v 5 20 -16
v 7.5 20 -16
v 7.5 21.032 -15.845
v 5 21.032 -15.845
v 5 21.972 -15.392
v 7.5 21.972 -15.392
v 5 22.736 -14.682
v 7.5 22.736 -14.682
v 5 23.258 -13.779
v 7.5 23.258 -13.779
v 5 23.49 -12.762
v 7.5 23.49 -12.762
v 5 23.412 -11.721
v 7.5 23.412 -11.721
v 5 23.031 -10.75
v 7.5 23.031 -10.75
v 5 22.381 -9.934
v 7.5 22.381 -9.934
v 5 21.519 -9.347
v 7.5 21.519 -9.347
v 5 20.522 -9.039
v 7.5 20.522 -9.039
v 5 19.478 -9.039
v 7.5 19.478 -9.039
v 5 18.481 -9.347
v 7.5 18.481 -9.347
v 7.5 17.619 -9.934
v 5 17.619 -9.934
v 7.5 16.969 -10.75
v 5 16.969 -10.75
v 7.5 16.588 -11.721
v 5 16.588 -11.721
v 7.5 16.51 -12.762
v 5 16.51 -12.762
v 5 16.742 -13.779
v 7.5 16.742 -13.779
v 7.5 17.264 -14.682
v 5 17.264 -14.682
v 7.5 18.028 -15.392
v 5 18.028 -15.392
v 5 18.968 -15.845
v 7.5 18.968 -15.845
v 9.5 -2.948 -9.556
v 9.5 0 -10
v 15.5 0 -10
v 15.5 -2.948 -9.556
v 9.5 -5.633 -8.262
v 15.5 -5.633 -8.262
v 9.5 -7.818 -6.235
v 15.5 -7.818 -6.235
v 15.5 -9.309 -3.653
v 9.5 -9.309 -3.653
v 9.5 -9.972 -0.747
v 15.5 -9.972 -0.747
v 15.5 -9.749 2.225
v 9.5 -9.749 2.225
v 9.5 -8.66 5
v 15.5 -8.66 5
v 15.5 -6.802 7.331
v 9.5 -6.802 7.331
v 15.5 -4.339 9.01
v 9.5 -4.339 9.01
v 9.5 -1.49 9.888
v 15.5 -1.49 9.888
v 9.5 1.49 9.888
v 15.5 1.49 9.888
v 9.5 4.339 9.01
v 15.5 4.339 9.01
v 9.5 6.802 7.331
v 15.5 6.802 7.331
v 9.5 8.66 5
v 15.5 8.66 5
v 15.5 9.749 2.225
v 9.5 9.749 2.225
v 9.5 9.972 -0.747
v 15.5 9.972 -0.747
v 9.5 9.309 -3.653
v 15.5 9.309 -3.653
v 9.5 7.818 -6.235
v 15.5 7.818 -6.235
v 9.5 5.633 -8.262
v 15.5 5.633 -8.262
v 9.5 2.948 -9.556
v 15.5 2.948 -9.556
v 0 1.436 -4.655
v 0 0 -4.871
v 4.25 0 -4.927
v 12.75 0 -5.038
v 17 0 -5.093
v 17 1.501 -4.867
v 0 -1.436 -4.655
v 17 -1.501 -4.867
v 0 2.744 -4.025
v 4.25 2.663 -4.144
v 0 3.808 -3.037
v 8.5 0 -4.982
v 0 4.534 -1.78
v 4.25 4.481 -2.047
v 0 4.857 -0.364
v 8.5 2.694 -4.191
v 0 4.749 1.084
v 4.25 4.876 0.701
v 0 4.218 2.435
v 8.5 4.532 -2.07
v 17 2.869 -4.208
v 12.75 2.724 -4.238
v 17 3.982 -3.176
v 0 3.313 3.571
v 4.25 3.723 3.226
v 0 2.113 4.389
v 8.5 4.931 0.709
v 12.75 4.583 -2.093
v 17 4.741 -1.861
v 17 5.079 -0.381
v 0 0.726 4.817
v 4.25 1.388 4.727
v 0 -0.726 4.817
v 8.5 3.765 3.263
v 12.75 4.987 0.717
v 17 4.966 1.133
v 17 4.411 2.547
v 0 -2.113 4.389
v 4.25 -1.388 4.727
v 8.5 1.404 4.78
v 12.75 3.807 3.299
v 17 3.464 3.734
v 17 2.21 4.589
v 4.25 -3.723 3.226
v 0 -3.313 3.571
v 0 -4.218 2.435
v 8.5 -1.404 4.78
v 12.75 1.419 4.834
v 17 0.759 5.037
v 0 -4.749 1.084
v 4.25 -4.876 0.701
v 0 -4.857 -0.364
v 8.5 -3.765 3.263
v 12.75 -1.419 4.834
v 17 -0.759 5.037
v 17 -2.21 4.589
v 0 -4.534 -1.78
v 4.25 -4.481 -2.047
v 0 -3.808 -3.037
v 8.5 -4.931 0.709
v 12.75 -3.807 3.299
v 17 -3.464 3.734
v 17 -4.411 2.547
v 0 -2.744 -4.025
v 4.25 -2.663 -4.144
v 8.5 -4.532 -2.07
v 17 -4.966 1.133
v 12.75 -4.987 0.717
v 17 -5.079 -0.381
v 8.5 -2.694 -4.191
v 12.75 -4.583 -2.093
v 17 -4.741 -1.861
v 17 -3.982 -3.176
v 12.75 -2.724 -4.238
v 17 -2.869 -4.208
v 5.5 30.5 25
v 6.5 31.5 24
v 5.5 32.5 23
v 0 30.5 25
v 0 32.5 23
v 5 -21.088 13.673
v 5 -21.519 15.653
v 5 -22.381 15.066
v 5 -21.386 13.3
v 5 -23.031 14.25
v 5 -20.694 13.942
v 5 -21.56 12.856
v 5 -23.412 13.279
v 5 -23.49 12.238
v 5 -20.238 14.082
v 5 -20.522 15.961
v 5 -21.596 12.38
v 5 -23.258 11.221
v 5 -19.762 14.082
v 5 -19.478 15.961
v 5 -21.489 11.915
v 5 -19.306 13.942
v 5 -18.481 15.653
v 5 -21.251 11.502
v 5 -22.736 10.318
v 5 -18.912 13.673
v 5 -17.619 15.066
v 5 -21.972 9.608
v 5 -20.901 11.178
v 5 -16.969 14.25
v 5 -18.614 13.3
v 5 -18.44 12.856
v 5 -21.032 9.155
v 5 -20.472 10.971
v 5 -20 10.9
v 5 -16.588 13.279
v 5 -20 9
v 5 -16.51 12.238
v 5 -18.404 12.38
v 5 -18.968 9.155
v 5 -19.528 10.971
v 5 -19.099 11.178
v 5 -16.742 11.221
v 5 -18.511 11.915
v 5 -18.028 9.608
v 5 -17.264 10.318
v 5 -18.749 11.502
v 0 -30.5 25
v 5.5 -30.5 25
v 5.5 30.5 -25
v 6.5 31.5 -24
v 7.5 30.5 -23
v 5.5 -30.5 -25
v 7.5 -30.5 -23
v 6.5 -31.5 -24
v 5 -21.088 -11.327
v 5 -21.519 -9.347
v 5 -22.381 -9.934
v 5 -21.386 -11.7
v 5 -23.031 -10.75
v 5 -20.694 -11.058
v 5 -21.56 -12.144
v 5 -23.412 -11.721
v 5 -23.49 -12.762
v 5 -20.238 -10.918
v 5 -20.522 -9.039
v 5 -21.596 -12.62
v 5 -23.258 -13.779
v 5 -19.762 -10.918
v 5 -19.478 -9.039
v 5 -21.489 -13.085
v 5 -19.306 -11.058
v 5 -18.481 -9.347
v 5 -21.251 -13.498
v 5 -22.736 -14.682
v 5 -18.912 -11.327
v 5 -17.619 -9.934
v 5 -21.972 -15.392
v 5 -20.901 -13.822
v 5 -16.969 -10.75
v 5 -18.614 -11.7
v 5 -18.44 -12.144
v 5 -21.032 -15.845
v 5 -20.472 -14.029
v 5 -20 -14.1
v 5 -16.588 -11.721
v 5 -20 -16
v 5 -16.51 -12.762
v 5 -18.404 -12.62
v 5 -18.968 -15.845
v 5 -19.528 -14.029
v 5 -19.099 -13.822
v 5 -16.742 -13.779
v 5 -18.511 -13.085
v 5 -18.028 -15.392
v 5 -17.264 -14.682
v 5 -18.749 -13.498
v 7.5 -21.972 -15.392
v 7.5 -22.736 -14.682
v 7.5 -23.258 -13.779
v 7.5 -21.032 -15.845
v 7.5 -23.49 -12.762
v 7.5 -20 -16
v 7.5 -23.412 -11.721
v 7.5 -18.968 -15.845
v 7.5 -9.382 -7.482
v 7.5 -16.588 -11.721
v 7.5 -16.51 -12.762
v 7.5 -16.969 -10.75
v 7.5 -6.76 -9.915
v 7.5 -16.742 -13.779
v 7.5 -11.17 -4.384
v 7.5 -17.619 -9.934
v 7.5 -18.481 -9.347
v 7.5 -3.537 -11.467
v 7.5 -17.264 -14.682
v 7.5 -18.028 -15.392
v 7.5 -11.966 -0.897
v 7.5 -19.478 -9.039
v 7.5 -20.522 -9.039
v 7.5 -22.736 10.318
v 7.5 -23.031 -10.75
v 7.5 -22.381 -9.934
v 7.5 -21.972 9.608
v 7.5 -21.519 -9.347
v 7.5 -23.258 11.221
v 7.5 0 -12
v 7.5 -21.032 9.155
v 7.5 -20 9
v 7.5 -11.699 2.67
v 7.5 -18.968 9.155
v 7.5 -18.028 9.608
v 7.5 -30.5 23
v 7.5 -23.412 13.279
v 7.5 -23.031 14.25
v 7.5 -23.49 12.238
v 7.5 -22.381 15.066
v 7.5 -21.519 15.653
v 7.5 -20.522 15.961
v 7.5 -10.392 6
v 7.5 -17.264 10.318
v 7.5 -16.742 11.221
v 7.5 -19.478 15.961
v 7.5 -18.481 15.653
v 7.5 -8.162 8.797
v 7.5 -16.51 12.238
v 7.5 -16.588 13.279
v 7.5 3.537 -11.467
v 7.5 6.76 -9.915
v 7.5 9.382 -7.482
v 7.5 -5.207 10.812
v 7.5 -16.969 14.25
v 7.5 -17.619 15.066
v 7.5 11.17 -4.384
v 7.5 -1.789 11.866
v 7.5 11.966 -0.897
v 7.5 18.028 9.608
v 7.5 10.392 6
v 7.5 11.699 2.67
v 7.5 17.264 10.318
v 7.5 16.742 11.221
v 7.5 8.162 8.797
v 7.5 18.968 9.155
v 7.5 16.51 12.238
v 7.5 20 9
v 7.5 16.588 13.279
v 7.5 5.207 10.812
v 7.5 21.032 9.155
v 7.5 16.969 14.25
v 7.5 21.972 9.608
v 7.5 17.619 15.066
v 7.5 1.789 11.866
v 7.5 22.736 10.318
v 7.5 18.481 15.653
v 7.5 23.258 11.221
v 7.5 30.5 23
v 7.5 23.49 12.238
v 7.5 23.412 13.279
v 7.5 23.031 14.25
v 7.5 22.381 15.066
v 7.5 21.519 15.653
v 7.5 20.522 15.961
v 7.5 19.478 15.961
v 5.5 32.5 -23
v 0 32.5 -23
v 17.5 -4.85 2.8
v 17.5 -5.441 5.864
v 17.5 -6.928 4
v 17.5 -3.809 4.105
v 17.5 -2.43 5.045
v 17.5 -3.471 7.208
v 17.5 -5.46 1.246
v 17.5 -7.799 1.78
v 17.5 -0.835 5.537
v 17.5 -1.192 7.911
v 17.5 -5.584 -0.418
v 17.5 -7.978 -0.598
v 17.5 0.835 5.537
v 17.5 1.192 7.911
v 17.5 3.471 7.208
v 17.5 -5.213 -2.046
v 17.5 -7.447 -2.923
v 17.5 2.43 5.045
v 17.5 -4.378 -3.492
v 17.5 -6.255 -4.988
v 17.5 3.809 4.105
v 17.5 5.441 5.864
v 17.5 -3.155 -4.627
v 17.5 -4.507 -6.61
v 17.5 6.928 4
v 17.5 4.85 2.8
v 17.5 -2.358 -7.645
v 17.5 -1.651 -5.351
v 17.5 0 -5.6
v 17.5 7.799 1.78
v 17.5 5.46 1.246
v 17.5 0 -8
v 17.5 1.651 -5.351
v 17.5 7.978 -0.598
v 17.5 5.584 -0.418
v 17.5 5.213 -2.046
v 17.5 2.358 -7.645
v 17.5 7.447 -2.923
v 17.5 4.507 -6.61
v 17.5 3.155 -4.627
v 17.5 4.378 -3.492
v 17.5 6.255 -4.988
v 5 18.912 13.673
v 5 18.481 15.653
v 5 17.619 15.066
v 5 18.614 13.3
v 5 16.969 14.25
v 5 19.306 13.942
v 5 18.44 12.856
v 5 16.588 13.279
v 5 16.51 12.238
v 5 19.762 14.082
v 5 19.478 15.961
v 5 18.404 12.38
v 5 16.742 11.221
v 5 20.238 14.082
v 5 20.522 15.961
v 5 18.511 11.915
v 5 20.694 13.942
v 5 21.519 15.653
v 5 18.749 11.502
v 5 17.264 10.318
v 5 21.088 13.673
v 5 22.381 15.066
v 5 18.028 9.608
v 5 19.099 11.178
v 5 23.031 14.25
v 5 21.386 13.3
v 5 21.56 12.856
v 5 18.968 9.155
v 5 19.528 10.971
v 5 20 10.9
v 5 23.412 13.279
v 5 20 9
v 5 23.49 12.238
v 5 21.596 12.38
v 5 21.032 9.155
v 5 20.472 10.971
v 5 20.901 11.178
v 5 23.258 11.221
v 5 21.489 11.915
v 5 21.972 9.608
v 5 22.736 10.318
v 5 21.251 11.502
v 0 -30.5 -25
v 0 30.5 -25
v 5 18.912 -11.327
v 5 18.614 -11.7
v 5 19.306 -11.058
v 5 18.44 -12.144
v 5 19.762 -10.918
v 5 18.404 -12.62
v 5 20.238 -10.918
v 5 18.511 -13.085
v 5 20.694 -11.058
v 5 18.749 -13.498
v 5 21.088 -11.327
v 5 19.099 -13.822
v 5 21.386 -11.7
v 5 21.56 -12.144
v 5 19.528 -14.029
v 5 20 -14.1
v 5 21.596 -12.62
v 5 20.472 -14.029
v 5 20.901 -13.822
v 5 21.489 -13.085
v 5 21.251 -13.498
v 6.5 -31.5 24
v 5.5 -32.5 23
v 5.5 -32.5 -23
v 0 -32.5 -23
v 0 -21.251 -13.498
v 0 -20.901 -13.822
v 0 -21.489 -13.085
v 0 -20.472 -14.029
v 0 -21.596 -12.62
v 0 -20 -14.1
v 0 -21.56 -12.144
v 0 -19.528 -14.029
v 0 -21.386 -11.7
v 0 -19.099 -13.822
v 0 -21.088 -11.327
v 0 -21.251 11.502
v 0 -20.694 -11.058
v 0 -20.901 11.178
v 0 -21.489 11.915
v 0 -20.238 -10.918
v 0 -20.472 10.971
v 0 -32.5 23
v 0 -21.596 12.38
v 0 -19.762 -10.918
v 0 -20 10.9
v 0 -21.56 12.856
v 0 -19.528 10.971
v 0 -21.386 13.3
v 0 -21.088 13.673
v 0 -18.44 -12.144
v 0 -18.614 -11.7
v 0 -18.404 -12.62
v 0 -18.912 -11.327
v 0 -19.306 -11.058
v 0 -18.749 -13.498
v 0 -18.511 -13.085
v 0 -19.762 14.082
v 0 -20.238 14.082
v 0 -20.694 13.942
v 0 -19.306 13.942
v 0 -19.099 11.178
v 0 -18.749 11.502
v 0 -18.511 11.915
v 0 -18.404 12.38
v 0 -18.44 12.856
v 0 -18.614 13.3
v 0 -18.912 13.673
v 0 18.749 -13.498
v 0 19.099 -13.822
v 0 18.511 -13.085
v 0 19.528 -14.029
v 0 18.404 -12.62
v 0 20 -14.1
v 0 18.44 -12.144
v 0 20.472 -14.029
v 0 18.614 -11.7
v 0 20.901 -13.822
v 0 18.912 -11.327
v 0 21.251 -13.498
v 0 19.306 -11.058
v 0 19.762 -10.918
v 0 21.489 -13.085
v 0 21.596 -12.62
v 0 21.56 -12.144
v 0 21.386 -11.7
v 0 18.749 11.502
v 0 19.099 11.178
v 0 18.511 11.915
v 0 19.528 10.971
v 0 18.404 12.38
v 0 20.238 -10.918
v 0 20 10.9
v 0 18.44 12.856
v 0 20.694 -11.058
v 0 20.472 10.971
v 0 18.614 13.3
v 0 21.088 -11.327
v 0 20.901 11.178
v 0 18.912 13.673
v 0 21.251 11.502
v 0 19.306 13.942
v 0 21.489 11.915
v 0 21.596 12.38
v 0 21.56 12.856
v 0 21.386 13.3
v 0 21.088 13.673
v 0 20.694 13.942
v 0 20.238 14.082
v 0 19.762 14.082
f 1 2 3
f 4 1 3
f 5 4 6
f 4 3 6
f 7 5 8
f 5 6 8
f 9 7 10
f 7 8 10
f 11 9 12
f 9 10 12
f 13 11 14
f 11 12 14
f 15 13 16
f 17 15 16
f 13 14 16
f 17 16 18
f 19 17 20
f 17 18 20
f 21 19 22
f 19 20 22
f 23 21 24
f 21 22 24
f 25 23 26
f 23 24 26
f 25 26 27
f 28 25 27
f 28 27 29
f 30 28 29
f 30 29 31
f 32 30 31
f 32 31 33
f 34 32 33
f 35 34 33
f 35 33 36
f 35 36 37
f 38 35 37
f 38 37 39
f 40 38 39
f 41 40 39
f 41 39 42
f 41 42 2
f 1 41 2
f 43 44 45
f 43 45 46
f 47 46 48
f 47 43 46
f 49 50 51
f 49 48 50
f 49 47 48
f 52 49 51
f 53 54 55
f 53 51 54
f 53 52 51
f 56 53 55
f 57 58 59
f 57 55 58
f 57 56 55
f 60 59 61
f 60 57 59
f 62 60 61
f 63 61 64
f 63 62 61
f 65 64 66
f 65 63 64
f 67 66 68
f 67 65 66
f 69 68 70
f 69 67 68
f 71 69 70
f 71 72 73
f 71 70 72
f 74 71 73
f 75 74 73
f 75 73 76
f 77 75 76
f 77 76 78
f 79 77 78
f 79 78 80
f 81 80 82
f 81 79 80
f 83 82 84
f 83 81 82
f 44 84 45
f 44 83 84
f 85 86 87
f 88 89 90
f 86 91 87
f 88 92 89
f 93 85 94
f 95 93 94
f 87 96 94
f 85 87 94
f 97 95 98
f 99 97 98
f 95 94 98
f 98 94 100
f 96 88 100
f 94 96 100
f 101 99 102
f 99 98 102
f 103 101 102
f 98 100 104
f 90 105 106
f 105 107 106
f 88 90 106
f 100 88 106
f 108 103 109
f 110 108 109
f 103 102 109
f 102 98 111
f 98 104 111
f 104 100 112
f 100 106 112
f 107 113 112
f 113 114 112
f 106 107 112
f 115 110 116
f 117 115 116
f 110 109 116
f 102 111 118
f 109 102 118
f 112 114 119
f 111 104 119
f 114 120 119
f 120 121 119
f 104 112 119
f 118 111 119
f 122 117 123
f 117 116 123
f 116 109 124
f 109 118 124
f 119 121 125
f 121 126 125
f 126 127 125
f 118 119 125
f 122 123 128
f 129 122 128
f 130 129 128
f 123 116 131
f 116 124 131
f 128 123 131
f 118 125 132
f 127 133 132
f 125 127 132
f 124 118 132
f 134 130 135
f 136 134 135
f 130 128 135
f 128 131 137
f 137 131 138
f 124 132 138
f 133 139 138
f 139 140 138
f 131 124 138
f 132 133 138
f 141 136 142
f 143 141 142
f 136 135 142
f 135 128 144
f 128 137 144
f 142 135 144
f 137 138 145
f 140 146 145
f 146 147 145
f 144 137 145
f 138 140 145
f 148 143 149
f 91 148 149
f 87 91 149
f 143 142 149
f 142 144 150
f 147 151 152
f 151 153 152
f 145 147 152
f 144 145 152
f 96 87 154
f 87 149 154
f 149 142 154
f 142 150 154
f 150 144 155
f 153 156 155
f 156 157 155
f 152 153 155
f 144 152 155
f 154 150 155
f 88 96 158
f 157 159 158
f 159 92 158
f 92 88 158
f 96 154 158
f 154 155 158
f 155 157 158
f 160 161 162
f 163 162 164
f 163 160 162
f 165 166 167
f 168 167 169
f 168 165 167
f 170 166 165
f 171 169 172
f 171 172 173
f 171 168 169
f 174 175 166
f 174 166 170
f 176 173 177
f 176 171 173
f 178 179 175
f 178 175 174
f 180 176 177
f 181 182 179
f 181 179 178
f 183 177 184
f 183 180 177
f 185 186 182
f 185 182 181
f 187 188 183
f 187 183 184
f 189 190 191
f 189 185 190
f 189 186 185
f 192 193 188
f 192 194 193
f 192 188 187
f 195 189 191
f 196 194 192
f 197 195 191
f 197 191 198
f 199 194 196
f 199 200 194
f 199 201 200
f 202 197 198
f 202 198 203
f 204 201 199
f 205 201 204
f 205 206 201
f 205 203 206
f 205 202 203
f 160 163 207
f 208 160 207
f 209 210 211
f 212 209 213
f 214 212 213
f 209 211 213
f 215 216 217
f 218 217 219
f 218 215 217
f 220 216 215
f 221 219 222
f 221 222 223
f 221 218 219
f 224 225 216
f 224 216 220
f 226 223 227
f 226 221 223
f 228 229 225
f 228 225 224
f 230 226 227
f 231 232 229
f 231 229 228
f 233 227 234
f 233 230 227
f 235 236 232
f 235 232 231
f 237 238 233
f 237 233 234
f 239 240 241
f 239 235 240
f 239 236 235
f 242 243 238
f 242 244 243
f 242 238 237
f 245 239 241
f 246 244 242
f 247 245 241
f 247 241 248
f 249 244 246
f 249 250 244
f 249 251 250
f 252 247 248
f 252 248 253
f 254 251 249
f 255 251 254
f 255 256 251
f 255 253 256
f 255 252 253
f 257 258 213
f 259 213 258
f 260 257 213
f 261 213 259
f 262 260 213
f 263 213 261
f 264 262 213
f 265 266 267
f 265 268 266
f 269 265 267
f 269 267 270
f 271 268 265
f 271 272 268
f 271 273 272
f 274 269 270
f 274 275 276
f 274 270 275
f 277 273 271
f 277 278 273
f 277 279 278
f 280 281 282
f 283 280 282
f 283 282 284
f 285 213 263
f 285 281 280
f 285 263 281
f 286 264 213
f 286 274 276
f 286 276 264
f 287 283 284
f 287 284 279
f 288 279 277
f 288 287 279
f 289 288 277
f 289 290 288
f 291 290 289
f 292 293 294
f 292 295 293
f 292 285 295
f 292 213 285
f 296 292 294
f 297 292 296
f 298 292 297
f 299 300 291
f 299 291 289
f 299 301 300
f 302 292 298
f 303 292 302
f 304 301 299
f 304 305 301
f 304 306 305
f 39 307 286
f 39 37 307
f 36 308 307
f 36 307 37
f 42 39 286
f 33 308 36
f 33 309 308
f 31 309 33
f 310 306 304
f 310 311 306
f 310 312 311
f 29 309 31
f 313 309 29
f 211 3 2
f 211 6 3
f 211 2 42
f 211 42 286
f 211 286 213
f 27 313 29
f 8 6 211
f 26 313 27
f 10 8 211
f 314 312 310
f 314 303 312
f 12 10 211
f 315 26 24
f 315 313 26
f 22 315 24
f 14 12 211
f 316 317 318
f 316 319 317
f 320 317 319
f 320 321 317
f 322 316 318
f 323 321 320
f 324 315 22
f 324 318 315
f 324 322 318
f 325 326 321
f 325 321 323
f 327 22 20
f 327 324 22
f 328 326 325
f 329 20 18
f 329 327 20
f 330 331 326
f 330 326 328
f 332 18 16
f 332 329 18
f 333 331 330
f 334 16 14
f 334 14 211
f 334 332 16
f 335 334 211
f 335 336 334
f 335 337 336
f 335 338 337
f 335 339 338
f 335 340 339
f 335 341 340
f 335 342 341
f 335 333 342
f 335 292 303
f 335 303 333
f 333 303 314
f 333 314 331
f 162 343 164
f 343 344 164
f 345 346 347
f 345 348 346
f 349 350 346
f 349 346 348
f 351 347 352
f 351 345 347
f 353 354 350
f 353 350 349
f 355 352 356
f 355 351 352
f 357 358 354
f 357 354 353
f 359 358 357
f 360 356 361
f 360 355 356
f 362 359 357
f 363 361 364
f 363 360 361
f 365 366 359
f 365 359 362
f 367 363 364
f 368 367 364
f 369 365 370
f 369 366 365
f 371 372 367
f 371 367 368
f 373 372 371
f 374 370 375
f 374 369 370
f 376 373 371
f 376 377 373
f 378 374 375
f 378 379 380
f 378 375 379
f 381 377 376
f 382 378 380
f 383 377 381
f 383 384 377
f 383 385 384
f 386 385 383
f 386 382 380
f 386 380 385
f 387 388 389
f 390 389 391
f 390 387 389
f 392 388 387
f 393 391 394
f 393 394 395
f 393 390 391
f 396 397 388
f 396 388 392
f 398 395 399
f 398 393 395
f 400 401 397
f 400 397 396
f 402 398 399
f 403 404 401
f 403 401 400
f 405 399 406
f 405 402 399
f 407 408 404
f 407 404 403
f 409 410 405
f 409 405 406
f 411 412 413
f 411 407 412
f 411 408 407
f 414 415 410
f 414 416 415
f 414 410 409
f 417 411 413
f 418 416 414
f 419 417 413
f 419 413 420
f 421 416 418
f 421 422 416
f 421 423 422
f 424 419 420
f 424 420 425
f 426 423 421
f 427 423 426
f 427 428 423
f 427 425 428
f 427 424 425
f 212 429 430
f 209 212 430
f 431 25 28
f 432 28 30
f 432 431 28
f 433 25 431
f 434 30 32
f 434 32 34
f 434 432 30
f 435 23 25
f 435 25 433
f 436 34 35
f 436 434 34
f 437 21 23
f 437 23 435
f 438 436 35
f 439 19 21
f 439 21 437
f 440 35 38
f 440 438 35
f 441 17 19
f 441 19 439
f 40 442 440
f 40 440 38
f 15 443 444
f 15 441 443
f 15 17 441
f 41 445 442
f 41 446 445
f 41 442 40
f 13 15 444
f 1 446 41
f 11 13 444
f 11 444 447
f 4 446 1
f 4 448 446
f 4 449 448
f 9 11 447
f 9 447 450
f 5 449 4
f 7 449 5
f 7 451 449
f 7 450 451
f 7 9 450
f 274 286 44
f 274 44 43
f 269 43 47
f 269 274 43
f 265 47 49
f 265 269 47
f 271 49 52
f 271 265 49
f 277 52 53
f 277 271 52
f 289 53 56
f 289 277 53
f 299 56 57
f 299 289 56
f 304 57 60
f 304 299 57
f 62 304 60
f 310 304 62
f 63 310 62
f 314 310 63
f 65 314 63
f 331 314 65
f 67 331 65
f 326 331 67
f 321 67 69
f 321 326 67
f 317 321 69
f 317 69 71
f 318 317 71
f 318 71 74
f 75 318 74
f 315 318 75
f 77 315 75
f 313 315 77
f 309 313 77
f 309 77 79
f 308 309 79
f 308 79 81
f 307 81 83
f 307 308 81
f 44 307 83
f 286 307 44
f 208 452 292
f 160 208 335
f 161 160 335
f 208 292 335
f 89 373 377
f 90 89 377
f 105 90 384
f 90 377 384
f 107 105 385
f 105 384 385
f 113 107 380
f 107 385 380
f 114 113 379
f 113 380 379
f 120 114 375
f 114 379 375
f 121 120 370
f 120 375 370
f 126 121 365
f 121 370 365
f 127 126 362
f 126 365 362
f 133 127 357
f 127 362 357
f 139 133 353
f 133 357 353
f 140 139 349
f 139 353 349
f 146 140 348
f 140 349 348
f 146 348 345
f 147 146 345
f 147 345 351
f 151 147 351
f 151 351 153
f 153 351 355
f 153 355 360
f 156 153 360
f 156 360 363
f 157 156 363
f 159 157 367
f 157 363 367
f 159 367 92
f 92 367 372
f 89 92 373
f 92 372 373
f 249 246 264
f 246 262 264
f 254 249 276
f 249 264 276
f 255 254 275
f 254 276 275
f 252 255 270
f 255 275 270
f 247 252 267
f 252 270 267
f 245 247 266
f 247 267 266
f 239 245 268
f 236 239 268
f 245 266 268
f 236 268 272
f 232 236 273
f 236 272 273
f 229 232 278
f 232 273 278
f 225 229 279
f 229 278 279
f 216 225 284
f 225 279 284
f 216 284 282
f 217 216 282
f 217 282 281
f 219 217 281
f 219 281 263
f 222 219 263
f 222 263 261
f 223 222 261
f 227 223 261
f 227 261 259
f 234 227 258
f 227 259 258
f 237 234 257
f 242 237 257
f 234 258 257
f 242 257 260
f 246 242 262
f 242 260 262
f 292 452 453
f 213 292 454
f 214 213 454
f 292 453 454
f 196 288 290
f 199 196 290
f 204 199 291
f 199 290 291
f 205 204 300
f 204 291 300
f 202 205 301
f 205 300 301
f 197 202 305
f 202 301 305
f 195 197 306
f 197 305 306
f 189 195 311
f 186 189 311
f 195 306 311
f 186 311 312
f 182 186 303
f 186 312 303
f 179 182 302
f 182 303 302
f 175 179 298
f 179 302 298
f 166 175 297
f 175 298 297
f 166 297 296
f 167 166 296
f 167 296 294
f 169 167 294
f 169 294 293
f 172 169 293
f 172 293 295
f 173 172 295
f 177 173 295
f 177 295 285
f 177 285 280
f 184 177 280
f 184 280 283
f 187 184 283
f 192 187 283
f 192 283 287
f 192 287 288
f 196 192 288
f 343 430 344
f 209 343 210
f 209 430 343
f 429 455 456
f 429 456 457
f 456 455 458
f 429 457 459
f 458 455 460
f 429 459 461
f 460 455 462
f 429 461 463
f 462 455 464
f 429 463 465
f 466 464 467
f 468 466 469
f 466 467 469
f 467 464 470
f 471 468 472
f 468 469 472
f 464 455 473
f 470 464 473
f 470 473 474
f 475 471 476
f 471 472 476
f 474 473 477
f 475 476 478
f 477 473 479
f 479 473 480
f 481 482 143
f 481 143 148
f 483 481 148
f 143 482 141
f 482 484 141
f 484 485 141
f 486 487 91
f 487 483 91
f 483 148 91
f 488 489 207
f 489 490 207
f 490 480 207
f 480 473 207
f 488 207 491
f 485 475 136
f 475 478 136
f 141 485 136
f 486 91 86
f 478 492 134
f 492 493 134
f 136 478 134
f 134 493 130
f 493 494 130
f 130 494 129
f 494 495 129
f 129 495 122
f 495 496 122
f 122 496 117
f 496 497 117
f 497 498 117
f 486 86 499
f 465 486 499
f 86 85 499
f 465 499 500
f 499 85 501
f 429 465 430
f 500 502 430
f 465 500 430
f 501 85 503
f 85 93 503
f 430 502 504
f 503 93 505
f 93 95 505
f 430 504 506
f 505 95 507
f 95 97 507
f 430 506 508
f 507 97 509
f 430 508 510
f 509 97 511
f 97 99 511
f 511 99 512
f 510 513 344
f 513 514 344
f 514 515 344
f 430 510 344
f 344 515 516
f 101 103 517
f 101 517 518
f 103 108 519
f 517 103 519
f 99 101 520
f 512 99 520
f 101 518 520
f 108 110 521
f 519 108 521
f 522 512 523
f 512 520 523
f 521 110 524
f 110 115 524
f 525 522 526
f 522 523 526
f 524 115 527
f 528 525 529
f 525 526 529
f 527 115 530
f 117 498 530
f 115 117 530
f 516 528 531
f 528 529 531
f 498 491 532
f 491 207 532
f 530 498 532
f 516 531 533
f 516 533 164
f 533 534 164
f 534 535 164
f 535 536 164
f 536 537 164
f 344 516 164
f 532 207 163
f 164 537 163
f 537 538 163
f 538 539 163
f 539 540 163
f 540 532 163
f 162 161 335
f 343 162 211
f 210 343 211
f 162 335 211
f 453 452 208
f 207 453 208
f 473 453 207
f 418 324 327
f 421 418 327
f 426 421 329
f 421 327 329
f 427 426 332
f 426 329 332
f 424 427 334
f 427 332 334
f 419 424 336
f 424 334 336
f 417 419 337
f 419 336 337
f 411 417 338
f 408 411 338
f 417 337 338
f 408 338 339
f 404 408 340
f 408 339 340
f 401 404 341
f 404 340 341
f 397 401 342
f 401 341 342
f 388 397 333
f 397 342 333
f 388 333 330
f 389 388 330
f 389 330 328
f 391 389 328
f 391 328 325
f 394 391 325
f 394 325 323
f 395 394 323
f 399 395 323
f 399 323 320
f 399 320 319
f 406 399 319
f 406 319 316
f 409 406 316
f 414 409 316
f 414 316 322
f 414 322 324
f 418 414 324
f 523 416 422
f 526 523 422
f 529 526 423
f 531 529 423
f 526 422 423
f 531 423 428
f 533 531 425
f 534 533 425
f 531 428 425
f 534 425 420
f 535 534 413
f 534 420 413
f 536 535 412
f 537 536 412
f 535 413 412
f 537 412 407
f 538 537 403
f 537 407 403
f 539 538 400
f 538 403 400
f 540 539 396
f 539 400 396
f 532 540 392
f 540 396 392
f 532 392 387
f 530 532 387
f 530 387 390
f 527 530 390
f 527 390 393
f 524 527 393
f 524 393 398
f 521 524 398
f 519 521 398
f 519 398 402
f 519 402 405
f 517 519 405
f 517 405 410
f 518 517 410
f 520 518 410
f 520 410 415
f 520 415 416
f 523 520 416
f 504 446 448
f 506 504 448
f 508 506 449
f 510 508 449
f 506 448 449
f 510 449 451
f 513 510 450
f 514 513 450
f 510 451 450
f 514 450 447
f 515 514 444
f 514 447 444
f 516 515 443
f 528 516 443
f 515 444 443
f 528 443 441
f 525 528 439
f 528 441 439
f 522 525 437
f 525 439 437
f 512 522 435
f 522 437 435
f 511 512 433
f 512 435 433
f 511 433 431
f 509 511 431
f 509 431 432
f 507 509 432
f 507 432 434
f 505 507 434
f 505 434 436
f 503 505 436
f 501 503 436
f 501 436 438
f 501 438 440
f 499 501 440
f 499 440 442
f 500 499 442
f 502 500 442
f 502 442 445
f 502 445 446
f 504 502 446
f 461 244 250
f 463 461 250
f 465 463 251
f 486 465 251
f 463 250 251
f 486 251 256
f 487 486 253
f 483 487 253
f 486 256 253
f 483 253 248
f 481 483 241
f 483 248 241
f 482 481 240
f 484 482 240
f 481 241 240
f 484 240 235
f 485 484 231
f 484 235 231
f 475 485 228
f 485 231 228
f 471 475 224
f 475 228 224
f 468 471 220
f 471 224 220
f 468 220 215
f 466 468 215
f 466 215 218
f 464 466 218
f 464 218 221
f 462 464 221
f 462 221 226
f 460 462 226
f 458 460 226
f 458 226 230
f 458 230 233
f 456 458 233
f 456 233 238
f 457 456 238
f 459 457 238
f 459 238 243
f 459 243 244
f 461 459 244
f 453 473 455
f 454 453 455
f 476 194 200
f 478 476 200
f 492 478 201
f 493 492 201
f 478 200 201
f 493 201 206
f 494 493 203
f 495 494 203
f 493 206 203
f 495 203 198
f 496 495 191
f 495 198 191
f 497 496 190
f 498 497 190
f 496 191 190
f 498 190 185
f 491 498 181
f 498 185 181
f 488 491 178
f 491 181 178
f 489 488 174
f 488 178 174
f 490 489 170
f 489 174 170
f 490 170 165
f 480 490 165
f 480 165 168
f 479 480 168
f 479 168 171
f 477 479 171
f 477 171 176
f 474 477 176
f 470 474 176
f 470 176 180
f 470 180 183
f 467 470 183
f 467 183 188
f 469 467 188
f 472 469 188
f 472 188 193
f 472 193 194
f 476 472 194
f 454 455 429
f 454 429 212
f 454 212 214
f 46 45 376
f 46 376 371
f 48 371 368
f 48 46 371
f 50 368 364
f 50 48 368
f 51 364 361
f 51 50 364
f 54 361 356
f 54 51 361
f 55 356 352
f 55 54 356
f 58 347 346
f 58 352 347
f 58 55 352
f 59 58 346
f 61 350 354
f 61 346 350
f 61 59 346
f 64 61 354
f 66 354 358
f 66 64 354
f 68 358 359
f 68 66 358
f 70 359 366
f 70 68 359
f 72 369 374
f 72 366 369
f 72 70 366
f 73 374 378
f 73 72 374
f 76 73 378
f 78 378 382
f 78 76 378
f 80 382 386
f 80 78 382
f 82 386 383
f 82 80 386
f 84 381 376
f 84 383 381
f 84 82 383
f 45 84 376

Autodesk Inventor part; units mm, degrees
ref_plane "YZ Plane" through (0, 0, 0) normal (1, 0, 0) x (0, 1, 0)
ref_plane "XZ Plane" through (0, 0, 0) normal (0, 1, 0) x (-1, 0, 0)
ref_plane "XY Plane" through (0, 0, 0) normal (0, 0, 1) x (1, 0, 0)
sketch "Sketch1" plane through (0, 0, 0) normal (1, 0, 0) x (0, 1, 0)
  line L0 (32.5, 25) -> (-32.5, 25)
  line L1 (-32.5, 25) -> (-32.5, -25)
  line L2 (-32.5, -25) -> (32.5, -25)
  line L3 (32.5, -25) -> (32.5, 25)
  point P0 (0, 0)
  dimension "d0" = 65
  dimension "d1" = 50
  dimension "d2" = 32.5
  dimension "d3" = 25
extrude "Extrusion1" add sketch "Sketch1" along normal blind 7.5
sketch "Sketch2" plane through (7.5, 0, 0) normal (1, 0, 0) x (0, 0, -1)
  circle A0 centre (-12.5, 20) radius 1.6
  line L0 (25, 32.5) -> (-25, 32.5) projected
  line L1 (-25, 32.5) -> (-25, -32.5) projected
  circle A1 centre (12.5, 20) radius 1.6
  line L2 (25, -32.5) -> (25, 32.5) projected
  point P0 (0, 0)
  dimension "d6" = 3.2
  dimension "d7" = 12.5
  dimension "d8" = 12.5
  dimension "d9" = 3.2
  dimension "d10" = 12.5
  dimension "d11" = 12.5
extrude "Extrusion2" cut sketch "Sketch2" against normal through all
sketch "Sketch3" plane through (7.5, 0, 0) normal (1, 0, 0) x (0, 0, -1)
  circle A0 centre (0, 0) radius 10
  dimension "d14" = 20
extrude "Extrusion3" add sketch "Sketch3" along normal blind 10
sketch "Sketch4" plane through (17.5, 0, 0) normal (1, 0, 0) x (0, 0, -1)
  circle A0 centre (0, 0) radius 5.1
  dimension "d17" = 10.2
extrude "Extrusion4" cut sketch "Sketch4" against normal through all draft -0.75
chamfer "Chamfer1" distance 2 angle 45 6 edges at (7.5, 0, 10) (17.5, 0, 10) (7.5, 0, 25) (7.5, 32.5, 0) (7.5, 0, -25) (7.5, -32.5, 0)
chamfer "Chamfer2" distance 0.5 angle 45 1 edges at (17.5, 0, 5.1)
mirror "Mirror1" about plane through (0, 0, 0) normal (0, 1, 0) of "Extrusion2"
chamfer "Chamfer3" distance 2 angle 45 4 edges at (2.75, 32.5, 25) (2.75, 32.5, -25) (2.75, -32.5, 25) (2.75, -32.5, -25)
sketch "Sketch5" plane through (7.5, 0, 0) normal (1, 0, 0) x (0, 0, -1)
  circle A0 centre (-12.5, 20) radius 1.6 projected
  circle A1 centre (-12.5, 20) radius 3.5
  circle A2 centre (12.5, 20) radius 1.6 projected
  circle A3 centre (12.5, 20) radius 3.5
  circle A4 centre (12.5, -20) radius 1.6 projected
  circle A5 centre (12.5, -20) radius 3.5
  circle A6 centre (-12.5, -20) radius 1.6 projected
  circle A7 centre (-12.5, -20) radius 3.5
  point P0 (0, 0)
  dimension "d29" = 7
  dimension "d30" = 7
  dimension "d31" = 7
  dimension "d32" = 7
extrude "Extrusion5" cut sketch "Sketch5" against normal blind 2.5 contours A0 | A1 | A2 | A3 | A4 | A5 | A6 | A7
equation "\"d2\" = 0.5 * d0"
equation "\"d3\" = 0.5 * d1"
properties part number "Front_Cover"
